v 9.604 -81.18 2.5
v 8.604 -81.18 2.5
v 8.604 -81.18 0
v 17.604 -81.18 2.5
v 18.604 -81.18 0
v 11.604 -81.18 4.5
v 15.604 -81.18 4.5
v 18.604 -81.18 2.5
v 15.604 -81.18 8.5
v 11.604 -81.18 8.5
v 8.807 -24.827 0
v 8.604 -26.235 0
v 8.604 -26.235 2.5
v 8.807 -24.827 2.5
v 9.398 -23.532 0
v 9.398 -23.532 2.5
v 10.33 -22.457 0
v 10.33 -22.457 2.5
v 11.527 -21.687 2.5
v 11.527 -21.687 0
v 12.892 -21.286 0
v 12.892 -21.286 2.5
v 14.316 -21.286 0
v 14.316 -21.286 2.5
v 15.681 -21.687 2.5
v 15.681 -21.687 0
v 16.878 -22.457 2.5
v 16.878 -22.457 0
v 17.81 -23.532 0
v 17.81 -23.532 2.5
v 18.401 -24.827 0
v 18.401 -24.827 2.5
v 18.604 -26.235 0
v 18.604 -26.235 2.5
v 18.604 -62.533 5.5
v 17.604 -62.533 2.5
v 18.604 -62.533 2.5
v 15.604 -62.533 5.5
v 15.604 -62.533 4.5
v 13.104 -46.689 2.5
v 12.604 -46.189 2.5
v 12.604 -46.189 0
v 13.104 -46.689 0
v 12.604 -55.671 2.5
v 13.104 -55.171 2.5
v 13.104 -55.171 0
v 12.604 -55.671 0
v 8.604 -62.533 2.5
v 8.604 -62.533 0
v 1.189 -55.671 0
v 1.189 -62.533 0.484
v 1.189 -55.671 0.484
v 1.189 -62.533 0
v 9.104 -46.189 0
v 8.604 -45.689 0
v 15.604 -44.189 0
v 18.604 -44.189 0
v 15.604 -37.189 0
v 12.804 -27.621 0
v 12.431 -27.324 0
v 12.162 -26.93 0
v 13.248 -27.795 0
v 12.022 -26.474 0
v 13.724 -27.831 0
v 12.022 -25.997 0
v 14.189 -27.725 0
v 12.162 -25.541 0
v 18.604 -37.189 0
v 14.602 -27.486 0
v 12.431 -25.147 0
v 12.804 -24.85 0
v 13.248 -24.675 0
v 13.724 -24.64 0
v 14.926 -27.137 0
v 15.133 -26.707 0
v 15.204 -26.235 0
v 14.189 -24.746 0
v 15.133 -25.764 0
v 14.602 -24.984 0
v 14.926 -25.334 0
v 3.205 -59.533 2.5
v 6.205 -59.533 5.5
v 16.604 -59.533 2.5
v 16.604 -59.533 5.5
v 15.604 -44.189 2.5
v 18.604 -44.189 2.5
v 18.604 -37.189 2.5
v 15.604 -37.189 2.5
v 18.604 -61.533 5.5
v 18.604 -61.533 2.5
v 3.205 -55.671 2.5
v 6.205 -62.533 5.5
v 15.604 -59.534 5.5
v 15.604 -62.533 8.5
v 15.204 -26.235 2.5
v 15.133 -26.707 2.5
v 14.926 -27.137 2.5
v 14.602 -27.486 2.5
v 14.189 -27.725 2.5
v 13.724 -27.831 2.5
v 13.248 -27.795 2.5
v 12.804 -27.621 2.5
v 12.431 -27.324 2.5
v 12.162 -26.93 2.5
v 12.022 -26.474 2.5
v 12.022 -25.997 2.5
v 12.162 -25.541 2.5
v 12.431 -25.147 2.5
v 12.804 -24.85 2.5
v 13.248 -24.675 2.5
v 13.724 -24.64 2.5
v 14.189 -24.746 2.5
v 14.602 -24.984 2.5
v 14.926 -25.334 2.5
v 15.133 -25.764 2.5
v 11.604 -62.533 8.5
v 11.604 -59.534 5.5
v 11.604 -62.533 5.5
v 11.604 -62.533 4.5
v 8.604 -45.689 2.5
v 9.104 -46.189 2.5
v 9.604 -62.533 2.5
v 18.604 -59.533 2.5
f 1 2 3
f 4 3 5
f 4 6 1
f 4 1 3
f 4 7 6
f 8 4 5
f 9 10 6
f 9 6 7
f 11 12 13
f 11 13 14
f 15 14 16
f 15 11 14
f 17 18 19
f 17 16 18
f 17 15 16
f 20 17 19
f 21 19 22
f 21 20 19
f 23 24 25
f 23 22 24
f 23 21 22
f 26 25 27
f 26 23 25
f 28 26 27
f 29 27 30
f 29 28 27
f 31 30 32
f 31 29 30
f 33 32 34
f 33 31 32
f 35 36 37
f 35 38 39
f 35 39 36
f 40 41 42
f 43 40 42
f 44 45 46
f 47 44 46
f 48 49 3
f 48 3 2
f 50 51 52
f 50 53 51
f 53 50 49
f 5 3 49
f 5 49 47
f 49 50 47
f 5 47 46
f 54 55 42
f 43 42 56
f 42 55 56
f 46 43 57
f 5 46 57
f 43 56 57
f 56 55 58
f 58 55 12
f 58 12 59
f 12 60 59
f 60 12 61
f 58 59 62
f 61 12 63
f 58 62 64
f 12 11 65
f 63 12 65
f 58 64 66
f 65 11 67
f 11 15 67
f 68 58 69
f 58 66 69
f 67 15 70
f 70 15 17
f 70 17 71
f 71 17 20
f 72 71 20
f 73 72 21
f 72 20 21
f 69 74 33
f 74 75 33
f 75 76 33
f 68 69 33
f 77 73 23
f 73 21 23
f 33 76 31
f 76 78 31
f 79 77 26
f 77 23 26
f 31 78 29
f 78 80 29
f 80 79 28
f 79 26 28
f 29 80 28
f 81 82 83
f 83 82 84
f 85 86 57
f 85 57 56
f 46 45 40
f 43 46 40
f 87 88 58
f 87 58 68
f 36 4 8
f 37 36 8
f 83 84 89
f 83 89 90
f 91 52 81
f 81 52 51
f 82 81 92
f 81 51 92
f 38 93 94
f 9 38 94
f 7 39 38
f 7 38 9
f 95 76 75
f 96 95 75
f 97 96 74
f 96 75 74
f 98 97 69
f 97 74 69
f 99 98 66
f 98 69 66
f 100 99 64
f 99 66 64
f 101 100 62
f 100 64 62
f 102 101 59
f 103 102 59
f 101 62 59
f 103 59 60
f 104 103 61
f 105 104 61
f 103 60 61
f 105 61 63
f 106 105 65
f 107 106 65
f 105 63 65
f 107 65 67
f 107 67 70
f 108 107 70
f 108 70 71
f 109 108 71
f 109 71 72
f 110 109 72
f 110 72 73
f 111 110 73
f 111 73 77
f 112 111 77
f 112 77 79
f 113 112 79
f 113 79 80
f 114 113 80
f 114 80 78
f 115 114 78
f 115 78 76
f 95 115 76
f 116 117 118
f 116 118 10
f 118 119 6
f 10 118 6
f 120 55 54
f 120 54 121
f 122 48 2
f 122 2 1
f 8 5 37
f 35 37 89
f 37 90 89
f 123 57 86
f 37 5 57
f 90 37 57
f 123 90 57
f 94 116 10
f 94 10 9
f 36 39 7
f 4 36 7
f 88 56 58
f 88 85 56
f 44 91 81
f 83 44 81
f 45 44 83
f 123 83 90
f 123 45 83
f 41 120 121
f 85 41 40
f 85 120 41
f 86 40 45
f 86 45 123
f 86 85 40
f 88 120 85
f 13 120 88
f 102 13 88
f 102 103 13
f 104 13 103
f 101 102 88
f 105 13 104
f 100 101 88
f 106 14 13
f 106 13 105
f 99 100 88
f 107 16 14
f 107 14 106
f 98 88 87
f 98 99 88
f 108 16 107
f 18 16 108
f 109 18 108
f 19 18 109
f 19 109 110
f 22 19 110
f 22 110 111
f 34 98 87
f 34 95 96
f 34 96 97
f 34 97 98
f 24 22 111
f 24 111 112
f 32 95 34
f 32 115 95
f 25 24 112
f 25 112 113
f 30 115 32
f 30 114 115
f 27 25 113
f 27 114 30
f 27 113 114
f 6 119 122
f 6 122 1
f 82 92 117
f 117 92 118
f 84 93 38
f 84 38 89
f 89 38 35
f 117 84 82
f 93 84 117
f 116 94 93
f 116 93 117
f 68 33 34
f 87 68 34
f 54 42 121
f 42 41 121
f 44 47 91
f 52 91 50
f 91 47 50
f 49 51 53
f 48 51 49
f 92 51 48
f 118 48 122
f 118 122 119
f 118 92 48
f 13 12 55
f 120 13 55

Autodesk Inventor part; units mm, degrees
ref_plane "YZ Plane" through (0, 0, 0) normal (1, 0, 0) x (0, 1, 0)
ref_plane "XZ Plane" through (0, 0, 0) normal (0, 1, 0) x (-1, 0, 0)
sketch "Sketch1" plane through (0, 0, 0) normal (0, 0, 1) x (1, 0, 0)
  line L0 (8.404, 3) -> (8.404, -46.6888) projected
  line L1 (6.389, 0.2) -> (6.389, -55.1706) projected
  line L2 (7.404, -64.4706) -> (6.389, -64.4706) projected
  line L3 (6.389, -64.4706) -> (6.389, -78.3802) projected
  line L4 (-3.1786, -78.3802) -> (6.389, -78.3802) projected
  line L5 (-3.1786, -78.3802) -> (-3.1786, -81.1802) projected
  line L6 (8.404, -81.1802) -> (-3.1786, -81.1802) projected
  line L7 (8.404, -65.4706) -> (8.404, -81.1802) projected
  line L8 (8.604, -55.6706) -> (6.189, -55.6706)
  line L9 (6.189, -55.6706) -> (6.189, 0)
  line L10 (6.189, 0) -> (-3.3786, 0)
  line L11 (-3.3786, 0) -> (-3.3786, 3.2)
  line L12 (-3.3786, 3.2) -> (8.604, 3.2)
  line L13 (8.604, 3.2) -> (8.604, -55.6706)
  line L14 (8.604, -81.3802) -> (-3.3786, -81.3802)
  line L15 (-3.3786, -81.3802) -> (-3.3786, -78.1802)
  line L16 (-3.3786, -78.1802) -> (6.189, -78.1802)
  line L17 (6.189, -78.1802) -> (6.189, -64.2706)
  line L18 (6.189, -64.2706) -> (8.604, -64.2706)
  line L19 (8.604, -64.2706) -> (8.604, -81.3802)
  line L20 (13.604, -60.6706) -> (1.189, -60.6706)
  line L21 (1.189, -60.6706) -> (1.189, -5)
  line L22 (1.189, -5) -> (-8.3786, -5)
  line L23 (-8.3786, -5) -> (-8.3786, 8.2)
  line L24 (-8.3786, 8.2) -> (13.604, 8.2)
  line L25 (13.604, 8.2) -> (13.604, -60.6706)
  circle A0 centre (13.604, -26.2353) radius 5
  line L26 (18.604, -65.6706) -> (-3.811, -65.6706)
  line L27 (-3.811, -65.6706) -> (-3.811, -10)
  line L28 (-3.811, -10) -> (-13.3786, -10)
  line L29 (-13.3786, -10) -> (-13.3786, 13.2)
  line L30 (-13.3786, 13.2) -> (18.604, 13.2)
  line L31 (18.604, 13.2) -> (18.604, -65.6706)
  circle A1 centre (13.604, -26.2353) radius 1.6
  circle A2 centre (13.604, -26.2353) radius 30.3549
  circle A3 centre (13.604, -26.2353) radius 38.3626
  line L32 (8.604, -55.6706) -> (8.604, -56.1756)
  line L33 (6.189, -64.2706) -> (6.189, -63.8744)
  line L34 (6.189, -63.8744) -> (18.604, -63.8744)
  line L35 (6.189, -63.8744) -> (18.604, -63.8744) construction
  line L36 (8.604, -55.6706) -> (1.189, -55.6706)
  line L37 (1.189, -55.6706) -> (1.189, -63.8744)
  line L38 (1.189, -63.8744) -> (18.604, -63.8744)
  line L39 (1.189, -62.5334) -> (18.604, -62.5334)
  line L40 (1.189, -62.5334) -> (18.604, -62.5334) construction
  line L41 (6.389, -55.1706) -> (12.3969, -55.1706) projected
  line L42 (12.604, -54.9635) -> (12.3969, -55.1706) projected
  line L43 (12.604, -46.8959) -> (12.604, -54.9635) projected
  line L44 (12.3969, -46.6888) -> (12.604, -46.8959) projected
  line L45 (8.404, -46.6888) -> (12.3969, -46.6888) projected
  line L46 (-3.1786, 3) -> (8.404, 3) projected
  line L47 (-3.1786, 0.2) -> (-3.1786, 3) projected
  line L48 (-3.1786, 0.2) -> (6.389, 0.2) projected
  circle A4 centre (9.4965, -50.9297) radius 1.5 projected
  line L49 (7.404, -64.4706) -> (8.404, -65.4706) projected
  point P0 (0, 0)
  point P1 (8.604, -26.2353)
  point P2 (18.604, -26.2353)
  dimension "d0" = 0.2
  dimension "d1" = 0.2
  dimension "d2" = 5
  dimension "d3" = 5
  dimension "d4" = 3.2
  dimension "d5" = 0
  dimension "d6" = 0
extrude "Extrusion1" add sketch "Sketch1" along normal blind 2.5 contours L45 L44 L43 L42 L41 L13 A4 | L13 A0 L25 A2 L32 L41 L42 L43 L44 L45 | A0 L25 A1 | A4 L13 | A0 L25 A1 | A0 L31 A2 L25 | A2 L31 L39 L37 L20 L25 | L25 L20 L21 L36 A2 | L8 L32 A2 picked at (9.3865, -50.8083) picked at (16.7555, -47.8971)
sketch "Sketch2" plane through (1.189, -62.5334, 0) normal (0, -1, 0) x (1, 0, 0)
  line L0 (-0.8528, -0.0858) -> (2.6827, 3.4497) projected
  line L1 (-0.7114, -0.2272) -> (2.8241, 3.3083)
  line L2 (0, 2.5) -> (17.415, 2.5) projected
  line L3 (0, 0) -> (0, 2.5) projected
  point P0 (-1.189, 0)
  point P1 (0, 0.4842)
  point P2 (2.0158, 2.5)
  dimension "d9" = 0.2
extrude "Extrusion2" cut sketch "Sketch2" against normal through all
sketch "Sketch4" plane through (1.189, -62.5334, 0) normal (0, -1, 0) x (1, 0, 0)
  line L0 (2.0158, 2.5) -> (17.415, 2.5) projected
  line L1 (0, 0) -> (17.415, 0) projected
  line L2 (17.415, 0) -> (17.415, 2.5) projected
  line L3 (7.415, 0) -> (7.415, 2.5) projected
  point P0 (-1.189, 0)
ref_plane "Work Plane1" through (-8.1491, -81.1802, -17.0906) normal (0, -1, 0) x (0.7071068, 0, 0.7071068)
extrude "Extrusion3" add sketch "Sketch4" along normal up to surface (18.6468 mm away)
sketch "Sketch5" plane through (0, 0, 2.5) normal (0, 0, 1) x (1, 0, 0)
  line L0 (8.604, -26.2353) -> (8.604, -55.6706) projected
  circle A0 centre (13.604, -26.2353) radius 1.6 projected
  circle A1 centre (13.604, -26.2353) radius 29.857
  line L1 (8.604, -26.2353) -> (8.604, -55.6706) projected
  line L2 (8.604, -55.6706) -> (12.604, -55.6706)
  line L3 (8.604, -55.6706) -> (12.604, -55.6706) construction
  line L4 (12.604, -55.6706) -> (8.604, -55.6706)
  line L5 (8.604, -55.6706) -> (8.604, -51.6706)
  line L6 (8.604, -51.6706) -> (12.604, -51.6706)
  line L7 (12.604, -51.6706) -> (12.604, -55.6706)
  line L8 (12.604, -51.6706) -> (8.604, -51.6706)
  line L9 (8.604, -51.6706) -> (8.604, -47.6706)
  line L10 (8.604, -47.6706) -> (12.604, -47.6706)
  line L11 (12.604, -47.6706) -> (12.604, -51.6706)
  line L12 (12.604, -47.6706) -> (8.604, -47.6706)
  line L13 (8.604, -47.6706) -> (8.604, -46.6706)
  line L14 (8.604, -46.6706) -> (12.604, -46.6706)
  line L15 (12.604, -46.6706) -> (12.604, -47.6706)
  circle A2 centre (13.604, -26.2353) radius 20.4598
  circle A3 centre (13.604, -26.2353) radius 19.9598
  line L16 (12.604, -55.6706) -> (13.104, -55.6706)
  line L17 (13.104, -55.6706) -> (13.104, -46.1888)
  line L18 (13.104, -46.1888) -> (8.604, -46.1888)
  point P0 (0, 0)
  dimension "d22" = 0.5
  dimension "d14" = 4
  dimension "d15" = 0
  dimension "d16" = 4
  dimension "d17" = 4
  dimension "d18" = 4
  dimension "d19" = 4
  dimension "d20" = 4
  dimension "d21" = 1
  dimension "d23" = 0.5
  dimension "d24" = 90
  dimension "d25" = 90
extrude "Extrusion4" cut sketch "Sketch5" against normal blind 10 contours L18 A2 L14 L0 | L14 L15 L10 L0 | L18 L17 A2 | L10 L11 L6 L0 | A2 L17 L16 L7 L11 L15 | L6 L7 L2 L0
chamfer "Chamfer1" distance 0.5 angle 45 3 edges at (8.604, -46.1888, 1.25) (13.104, -46.1888, 1.25) (13.104, -55.6706, 1.25)
sketch "Sketch6" plane through (0, 0, 2.5) normal (0, 0, 1) x (1, 0, 0)
  line L0 (18.604, -26.2353) -> (18.604, -81.1802) projected
  line L1 (8.604, -62.5334) -> (8.604, -81.1802) projected
  line L2 (15.604, -26.2353) -> (15.604, -81.1802)
  line L3 (11.604, -62.5334) -> (11.604, -81.1802)
  line L4 (11.604, -62.5334) -> (15.604, -62.5334)
  line L5 (15.604, -62.5334) -> (15.604, -81.1802)
  line L6 (15.604, -81.1802) -> (11.604, -81.1802)
  line L7 (11.604, -81.1802) -> (11.604, -62.5334)
  point P0 (0, 0)
  dimension "d31" = 3
  dimension "d32" = 3
extrude "Extrusion5" add sketch "Sketch6" along normal blind 6
chamfer "Chamfer2" distance 2 angle 45 2 edges at (11.604, -71.8568, 2.5) (15.604, -71.8568, 2.5)
sketch "Sketch7" plane through (0, 0, 2.5) normal (0, 0, 1) x (1, 0, 0)
  line L0 (18.604, -26.2353) -> (18.604, -81.1802) projected
  line L1 (9.104, -46.1888) -> (12.604, -46.1888) projected
  line L2 (9.104, -44.1888) -> (12.604, -44.1888)
  line L3 (18.604, -44.1888) -> (15.604, -44.1888)
  line L4 (15.604, -44.1888) -> (15.604, -37.1888)
  line L5 (15.604, -37.1888) -> (18.604, -37.1888)
  line L6 (18.604, -37.1888) -> (18.604, -44.1888)
  point P0 (0, 0)
  dimension "d38" = 2
  dimension "d39" = 3
  dimension "d40" = 7
extrude "Extrusion6" cut sketch "Sketch7" against normal blind 6
sketch "Sketch9" plane through (1.189, -62.5334, 0) normal (0, -1, 0) x (1, 0, 0)
  line L0 (2.0158, 2.5) -> (7.415, 2.5) projected
  line L1 (2.0158, 2.5) -> (0, 0.4842) projected
  line L2 (7.415, 0) -> (7.415, 2.5) projected
  line L3 (7.415, 2.5) -> (7.415, 5.5)
  line L4 (7.415, 2.5) -> (10.415, 2.5) construction
  line L5 (0, 0.4842) -> (5.0158, 5.5)
  line L6 (17.415, 2.5) -> (17.415, 0) projected
  line L7 (5.0158, 5.5) -> (17.415, 5.5)
  line L8 (5.0158, 5.5) -> (17.415, 5.5) construction
  line L9 (17.415, 5.5) -> (17.415, 2.5)
  line L10 (17.415, 2.5) -> (7.415, 2.5)
  point P0 (-1.189, 0)
  dimension "d43" = 3
  dimension "d44" = 90
  dimension "d45" = 0
extrude "Extrusion7" add sketch "Sketch9" against normal blind 3
chamfer "Chamfer3" distance 2 angle 45 1 edges at (18.604, -59.5334, 4)
chamfer "Chamfer4" distance 3 angle 45 1 edges at (13.604, -62.5334, 5.5)
properties part number "LatchLock_3DPrint"
